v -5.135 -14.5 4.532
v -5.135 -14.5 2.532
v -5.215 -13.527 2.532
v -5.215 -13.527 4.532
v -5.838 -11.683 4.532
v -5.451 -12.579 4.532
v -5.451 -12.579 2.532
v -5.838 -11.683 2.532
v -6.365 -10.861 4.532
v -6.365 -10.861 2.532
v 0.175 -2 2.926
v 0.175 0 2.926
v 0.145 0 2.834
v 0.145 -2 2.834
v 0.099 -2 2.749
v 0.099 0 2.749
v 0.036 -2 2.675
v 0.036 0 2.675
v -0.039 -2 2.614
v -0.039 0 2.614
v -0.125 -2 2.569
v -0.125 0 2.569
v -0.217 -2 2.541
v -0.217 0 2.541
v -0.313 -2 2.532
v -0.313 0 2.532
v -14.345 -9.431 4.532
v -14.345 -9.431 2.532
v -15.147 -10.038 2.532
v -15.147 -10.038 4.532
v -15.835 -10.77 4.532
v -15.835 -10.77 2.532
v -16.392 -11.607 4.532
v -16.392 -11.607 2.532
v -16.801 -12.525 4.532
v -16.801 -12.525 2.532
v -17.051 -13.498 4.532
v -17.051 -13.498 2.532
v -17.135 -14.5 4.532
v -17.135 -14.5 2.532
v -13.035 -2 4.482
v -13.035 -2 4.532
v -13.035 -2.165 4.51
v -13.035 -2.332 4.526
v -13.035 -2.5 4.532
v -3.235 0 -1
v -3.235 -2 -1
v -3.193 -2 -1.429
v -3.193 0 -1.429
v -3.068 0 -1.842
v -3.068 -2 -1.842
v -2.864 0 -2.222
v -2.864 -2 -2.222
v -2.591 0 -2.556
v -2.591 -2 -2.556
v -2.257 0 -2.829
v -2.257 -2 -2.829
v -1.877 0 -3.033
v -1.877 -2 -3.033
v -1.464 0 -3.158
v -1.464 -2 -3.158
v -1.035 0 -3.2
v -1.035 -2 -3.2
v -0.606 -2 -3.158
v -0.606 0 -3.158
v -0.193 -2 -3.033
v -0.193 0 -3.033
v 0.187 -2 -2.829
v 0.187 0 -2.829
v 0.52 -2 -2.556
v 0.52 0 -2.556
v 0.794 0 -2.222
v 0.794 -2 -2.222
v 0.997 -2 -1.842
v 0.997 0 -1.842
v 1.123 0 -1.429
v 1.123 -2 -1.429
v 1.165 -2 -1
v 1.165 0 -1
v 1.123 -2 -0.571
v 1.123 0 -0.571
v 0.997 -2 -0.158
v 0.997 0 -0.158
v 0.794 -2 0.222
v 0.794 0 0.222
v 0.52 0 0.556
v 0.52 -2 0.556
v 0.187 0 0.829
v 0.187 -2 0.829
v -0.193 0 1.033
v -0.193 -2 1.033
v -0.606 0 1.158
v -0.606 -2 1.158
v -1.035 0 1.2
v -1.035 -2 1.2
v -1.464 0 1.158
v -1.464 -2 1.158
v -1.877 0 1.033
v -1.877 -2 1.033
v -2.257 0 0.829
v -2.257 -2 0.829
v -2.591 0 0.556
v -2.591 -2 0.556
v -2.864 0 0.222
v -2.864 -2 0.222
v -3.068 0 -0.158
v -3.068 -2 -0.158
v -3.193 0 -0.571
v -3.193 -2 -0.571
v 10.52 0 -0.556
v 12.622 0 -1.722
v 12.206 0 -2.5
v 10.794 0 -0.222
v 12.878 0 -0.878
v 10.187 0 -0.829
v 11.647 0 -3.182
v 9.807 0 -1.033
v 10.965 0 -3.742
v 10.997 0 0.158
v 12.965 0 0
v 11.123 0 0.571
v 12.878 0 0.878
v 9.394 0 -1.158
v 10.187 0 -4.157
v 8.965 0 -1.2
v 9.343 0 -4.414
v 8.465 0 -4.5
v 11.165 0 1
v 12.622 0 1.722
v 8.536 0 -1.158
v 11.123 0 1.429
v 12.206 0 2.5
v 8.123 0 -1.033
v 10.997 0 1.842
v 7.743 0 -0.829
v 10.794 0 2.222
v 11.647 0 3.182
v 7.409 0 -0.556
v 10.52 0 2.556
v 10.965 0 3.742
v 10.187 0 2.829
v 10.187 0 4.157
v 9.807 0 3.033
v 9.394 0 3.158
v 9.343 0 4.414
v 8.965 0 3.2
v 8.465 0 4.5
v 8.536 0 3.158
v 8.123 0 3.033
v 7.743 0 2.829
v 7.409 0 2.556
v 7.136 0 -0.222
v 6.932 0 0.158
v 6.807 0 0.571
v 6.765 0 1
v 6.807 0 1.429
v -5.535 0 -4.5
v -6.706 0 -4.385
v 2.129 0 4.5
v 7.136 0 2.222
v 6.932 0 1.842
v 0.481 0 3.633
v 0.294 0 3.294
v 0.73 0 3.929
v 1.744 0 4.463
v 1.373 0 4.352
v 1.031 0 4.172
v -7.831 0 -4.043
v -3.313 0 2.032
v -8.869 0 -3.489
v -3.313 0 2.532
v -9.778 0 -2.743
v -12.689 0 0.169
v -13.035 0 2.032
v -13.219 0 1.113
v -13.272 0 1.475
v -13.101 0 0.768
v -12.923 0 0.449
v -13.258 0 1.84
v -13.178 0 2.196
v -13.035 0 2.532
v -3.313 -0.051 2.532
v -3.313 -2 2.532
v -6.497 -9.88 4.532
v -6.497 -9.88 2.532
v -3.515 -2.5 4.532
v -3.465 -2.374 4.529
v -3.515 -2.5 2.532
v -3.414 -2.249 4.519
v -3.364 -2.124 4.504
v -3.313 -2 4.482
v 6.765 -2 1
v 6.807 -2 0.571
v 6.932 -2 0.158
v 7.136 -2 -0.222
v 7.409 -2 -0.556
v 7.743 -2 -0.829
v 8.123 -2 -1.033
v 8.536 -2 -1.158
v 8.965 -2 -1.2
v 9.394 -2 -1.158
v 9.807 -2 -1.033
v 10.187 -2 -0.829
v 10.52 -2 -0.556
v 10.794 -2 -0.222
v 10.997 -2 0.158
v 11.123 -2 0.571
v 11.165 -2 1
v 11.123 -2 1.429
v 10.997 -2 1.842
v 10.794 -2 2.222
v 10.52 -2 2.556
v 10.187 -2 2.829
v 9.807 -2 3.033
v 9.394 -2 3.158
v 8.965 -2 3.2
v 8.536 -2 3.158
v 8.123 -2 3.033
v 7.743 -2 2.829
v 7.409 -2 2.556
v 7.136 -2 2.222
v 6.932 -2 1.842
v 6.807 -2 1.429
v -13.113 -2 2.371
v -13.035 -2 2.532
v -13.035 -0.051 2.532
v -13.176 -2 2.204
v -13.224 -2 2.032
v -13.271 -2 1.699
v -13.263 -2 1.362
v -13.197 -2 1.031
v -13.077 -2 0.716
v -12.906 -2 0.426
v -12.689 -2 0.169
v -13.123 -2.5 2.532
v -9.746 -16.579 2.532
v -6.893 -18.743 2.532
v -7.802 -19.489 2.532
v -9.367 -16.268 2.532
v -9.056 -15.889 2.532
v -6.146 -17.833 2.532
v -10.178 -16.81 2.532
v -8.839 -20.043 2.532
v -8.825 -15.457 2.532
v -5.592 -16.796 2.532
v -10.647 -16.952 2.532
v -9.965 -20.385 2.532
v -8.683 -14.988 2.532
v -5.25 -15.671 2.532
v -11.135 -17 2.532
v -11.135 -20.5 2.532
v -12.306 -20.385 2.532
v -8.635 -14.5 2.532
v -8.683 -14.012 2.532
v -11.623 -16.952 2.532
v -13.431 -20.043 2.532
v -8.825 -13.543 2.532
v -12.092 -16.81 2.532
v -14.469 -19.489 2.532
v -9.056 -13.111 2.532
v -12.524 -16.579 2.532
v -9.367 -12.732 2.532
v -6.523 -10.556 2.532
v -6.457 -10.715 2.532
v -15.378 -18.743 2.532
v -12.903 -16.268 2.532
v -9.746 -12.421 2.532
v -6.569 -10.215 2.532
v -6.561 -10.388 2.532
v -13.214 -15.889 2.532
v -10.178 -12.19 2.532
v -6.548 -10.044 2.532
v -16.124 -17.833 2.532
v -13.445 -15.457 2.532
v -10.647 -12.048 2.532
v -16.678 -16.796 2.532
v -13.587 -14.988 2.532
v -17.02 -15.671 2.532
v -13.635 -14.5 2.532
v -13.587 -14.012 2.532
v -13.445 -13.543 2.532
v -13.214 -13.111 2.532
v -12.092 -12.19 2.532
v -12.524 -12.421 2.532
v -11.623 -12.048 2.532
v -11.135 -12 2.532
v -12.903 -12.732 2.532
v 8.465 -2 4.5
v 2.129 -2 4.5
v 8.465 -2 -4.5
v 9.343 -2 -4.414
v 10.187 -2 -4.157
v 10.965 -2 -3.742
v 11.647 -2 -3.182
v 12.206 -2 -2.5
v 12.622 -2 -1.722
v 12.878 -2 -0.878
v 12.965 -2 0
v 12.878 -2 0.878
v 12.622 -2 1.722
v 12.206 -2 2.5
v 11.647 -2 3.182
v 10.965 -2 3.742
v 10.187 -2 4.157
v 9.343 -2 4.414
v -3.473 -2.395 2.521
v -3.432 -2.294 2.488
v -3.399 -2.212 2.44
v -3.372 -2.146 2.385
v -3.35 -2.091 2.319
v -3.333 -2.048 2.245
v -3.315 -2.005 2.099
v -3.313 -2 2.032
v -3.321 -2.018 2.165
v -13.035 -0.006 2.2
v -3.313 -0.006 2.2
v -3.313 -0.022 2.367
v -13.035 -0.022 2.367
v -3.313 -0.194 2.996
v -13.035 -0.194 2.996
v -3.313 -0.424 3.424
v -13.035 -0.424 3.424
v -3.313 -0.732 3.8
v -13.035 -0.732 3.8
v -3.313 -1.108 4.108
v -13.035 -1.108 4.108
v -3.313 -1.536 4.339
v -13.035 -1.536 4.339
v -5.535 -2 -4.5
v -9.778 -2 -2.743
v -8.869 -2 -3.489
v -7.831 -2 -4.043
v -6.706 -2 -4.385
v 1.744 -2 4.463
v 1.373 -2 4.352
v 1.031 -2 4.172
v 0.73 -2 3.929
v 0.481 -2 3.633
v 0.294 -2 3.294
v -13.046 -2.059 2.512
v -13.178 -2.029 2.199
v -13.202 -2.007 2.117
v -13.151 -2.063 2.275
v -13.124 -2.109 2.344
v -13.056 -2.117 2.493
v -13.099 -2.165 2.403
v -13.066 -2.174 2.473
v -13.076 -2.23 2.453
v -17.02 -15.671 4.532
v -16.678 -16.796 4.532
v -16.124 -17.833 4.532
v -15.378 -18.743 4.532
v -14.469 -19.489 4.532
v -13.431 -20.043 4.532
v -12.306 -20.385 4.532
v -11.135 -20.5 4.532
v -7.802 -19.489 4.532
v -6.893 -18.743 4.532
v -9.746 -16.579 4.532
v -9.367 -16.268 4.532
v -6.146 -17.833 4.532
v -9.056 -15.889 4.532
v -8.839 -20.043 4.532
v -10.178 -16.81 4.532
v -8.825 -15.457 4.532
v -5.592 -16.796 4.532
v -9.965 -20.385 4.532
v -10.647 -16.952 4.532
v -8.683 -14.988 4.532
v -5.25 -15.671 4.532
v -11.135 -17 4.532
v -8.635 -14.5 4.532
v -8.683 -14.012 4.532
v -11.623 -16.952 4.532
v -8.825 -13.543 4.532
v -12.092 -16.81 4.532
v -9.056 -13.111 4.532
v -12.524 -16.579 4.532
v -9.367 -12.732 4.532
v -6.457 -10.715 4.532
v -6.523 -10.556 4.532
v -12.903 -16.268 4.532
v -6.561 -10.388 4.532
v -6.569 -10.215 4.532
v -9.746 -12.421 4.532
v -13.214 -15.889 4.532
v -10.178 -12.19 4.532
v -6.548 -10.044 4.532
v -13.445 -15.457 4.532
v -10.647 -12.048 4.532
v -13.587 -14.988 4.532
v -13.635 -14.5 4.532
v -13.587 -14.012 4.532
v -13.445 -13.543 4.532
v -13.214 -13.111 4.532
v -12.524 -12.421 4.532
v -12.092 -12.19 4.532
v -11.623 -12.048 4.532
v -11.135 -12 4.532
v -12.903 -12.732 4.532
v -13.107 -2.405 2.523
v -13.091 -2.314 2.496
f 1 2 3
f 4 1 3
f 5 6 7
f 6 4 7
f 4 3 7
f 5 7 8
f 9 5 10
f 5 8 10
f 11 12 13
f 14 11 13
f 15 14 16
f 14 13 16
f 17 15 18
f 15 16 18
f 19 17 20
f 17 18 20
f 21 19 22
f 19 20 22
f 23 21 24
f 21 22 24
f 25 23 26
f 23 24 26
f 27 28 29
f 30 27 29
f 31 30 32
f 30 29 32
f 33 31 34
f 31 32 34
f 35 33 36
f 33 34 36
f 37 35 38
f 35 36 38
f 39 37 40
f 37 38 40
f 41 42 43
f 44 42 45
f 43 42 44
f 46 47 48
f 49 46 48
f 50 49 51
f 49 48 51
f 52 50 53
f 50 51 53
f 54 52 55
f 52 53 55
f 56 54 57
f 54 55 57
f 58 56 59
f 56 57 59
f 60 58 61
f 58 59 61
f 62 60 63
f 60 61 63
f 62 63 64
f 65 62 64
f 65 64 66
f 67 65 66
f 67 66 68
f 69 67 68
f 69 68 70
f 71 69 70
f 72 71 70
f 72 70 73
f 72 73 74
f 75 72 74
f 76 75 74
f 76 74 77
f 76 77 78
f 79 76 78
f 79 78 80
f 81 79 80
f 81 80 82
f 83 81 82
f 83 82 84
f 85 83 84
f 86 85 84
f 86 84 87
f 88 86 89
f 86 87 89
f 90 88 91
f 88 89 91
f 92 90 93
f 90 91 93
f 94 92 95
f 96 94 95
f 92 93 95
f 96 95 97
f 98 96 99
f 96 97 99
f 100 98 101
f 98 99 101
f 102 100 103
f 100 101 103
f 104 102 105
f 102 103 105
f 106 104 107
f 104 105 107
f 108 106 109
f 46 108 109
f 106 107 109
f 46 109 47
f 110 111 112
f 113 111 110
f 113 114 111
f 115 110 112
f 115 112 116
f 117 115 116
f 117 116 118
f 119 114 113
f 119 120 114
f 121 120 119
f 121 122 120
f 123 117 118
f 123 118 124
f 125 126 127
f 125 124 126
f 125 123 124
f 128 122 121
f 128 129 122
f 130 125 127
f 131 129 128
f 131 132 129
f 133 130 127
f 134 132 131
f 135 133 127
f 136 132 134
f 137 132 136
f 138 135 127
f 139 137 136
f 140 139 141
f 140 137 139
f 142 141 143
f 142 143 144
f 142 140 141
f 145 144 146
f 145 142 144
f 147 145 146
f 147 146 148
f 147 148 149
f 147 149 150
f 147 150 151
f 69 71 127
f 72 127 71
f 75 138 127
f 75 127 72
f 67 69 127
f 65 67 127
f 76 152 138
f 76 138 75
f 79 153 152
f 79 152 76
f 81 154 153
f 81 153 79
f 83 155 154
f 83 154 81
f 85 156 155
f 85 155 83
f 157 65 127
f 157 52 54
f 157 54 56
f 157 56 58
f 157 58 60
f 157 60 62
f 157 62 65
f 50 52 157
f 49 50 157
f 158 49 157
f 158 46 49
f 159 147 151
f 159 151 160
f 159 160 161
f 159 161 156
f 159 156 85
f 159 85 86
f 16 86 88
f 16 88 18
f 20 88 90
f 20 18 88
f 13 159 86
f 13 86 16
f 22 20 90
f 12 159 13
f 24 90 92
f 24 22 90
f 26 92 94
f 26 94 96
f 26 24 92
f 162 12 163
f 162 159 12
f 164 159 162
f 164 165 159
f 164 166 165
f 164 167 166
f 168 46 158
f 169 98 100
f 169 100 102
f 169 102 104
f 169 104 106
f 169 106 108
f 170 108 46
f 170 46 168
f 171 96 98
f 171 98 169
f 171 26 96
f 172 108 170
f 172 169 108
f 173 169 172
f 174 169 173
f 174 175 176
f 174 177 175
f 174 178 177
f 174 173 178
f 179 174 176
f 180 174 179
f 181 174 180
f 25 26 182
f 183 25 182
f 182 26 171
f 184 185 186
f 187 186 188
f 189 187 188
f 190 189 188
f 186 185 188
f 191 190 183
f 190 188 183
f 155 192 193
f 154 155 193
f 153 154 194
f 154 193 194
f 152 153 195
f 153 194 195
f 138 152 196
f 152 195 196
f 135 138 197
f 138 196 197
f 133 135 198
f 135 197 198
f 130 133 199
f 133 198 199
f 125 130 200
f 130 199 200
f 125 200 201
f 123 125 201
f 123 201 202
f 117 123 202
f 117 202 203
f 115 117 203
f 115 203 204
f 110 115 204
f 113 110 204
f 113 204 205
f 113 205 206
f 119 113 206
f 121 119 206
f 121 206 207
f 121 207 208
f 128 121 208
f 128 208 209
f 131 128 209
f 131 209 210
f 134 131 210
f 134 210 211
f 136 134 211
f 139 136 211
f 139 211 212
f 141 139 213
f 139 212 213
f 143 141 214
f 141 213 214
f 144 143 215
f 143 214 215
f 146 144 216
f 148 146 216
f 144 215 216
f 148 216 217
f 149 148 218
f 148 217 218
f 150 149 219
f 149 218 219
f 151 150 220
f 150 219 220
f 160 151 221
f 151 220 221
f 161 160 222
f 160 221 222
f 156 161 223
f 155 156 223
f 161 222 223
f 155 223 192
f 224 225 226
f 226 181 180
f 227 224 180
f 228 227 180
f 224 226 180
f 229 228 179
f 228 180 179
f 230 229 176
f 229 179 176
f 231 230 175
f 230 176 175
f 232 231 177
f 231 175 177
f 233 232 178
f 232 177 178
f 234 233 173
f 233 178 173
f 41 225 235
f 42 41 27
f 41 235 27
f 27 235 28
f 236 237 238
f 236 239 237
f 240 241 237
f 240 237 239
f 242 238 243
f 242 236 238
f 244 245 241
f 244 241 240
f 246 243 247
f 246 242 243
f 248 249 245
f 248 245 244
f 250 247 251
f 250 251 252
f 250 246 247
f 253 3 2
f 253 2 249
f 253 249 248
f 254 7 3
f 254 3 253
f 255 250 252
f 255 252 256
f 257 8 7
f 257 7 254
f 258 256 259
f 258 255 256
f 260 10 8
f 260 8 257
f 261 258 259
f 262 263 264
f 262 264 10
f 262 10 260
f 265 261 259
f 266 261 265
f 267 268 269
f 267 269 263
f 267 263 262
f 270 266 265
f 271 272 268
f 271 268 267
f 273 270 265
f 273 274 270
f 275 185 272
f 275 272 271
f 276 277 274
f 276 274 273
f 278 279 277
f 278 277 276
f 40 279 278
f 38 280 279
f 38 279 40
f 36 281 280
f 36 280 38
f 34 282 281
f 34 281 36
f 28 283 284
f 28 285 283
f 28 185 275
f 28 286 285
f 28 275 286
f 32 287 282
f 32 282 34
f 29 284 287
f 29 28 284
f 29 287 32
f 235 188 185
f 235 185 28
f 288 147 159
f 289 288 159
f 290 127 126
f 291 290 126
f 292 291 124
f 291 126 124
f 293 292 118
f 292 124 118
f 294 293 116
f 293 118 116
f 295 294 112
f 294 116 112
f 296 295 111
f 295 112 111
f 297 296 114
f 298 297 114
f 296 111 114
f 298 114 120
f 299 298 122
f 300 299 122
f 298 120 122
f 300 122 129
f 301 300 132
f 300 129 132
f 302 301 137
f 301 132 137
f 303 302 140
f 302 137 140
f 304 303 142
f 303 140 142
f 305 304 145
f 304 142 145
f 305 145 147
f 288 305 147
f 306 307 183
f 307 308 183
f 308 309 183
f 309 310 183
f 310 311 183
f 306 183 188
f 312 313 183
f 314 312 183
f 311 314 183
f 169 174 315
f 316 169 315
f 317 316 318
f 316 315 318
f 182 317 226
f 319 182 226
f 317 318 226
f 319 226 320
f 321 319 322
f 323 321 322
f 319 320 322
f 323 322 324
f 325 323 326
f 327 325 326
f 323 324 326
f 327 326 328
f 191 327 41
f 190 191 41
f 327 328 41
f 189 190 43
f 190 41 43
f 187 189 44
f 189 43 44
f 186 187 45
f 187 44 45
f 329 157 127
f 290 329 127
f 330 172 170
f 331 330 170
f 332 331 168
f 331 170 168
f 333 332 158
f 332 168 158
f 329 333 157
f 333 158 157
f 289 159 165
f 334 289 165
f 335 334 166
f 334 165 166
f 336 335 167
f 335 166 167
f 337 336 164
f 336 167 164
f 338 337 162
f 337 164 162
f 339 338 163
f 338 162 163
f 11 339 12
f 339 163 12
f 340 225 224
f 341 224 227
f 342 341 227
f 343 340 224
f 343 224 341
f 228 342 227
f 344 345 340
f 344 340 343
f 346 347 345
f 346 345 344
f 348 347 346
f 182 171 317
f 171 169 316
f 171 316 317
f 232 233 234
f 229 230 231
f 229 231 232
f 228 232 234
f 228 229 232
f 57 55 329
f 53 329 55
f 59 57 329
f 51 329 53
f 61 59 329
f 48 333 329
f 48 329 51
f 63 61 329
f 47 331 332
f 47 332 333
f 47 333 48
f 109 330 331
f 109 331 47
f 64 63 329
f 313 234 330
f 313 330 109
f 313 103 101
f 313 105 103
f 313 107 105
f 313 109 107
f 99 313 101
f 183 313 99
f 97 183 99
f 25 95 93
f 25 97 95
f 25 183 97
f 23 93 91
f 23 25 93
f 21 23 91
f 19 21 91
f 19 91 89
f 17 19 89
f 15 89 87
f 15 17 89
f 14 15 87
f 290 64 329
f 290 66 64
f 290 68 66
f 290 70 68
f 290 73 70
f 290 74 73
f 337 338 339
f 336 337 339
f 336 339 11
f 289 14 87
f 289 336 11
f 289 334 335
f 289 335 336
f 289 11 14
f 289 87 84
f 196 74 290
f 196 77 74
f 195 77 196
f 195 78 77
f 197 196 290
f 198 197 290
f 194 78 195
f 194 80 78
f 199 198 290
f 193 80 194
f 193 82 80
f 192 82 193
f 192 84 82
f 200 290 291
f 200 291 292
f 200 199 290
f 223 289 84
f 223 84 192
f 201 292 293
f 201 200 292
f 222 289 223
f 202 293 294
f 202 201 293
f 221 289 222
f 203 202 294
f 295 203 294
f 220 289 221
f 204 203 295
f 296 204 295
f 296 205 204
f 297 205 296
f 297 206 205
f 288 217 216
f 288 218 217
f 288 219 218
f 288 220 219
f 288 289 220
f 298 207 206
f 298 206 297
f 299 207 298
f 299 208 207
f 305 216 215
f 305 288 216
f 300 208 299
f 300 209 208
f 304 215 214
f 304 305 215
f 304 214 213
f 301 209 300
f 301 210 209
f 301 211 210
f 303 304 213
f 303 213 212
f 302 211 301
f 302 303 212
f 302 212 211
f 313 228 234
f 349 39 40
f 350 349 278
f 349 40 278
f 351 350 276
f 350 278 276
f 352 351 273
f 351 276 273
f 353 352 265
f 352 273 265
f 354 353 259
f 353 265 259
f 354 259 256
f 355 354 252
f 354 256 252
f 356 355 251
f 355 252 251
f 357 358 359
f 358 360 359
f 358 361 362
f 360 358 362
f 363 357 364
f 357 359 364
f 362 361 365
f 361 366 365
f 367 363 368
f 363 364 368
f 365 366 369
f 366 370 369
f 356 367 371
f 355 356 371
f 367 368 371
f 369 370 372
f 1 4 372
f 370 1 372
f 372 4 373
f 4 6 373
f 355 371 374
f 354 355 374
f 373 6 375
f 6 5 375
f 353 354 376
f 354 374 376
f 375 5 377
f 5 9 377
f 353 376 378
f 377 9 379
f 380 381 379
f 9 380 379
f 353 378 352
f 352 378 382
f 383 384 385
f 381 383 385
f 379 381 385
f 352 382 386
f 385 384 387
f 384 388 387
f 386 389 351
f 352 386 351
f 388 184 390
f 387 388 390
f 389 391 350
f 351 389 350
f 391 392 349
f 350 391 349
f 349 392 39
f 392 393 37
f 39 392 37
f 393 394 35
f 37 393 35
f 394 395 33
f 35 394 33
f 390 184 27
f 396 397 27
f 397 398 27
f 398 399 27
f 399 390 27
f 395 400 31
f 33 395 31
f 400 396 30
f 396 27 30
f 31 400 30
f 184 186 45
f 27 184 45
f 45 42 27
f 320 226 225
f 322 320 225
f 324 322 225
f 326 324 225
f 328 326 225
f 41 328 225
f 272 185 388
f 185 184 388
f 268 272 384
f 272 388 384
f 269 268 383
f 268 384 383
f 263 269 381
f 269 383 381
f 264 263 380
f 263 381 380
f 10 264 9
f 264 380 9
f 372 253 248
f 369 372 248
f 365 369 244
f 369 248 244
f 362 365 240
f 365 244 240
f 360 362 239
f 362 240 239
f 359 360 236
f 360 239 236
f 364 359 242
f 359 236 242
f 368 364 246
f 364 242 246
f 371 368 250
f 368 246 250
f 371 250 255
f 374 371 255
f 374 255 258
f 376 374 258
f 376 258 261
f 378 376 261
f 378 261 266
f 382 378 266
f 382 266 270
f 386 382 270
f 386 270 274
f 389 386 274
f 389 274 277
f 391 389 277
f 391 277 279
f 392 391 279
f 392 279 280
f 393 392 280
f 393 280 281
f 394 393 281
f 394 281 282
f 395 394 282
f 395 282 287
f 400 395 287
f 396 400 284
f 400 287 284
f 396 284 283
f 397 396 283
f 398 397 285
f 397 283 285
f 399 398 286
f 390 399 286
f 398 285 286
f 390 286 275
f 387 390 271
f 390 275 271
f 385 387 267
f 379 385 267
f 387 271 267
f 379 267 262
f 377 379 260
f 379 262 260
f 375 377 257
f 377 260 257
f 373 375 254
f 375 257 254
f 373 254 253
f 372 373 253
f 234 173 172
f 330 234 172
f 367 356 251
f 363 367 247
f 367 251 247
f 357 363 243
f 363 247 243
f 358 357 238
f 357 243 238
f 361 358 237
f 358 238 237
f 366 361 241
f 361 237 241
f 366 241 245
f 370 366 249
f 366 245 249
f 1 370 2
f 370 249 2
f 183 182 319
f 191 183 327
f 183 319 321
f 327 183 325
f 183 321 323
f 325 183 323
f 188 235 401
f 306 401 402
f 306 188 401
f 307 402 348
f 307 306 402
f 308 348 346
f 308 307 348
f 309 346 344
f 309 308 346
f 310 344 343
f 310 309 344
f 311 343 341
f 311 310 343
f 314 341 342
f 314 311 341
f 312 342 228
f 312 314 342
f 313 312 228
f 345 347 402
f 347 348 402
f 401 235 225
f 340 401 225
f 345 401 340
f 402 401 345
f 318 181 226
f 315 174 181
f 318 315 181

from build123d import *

# Parameters (mm, degrees)
F1_DEPTH     = 2
F2_D         = 4.4
F3_W         = 13.8216872486
F3_H         = 2
F4_DEPTH     = 20.5
F5_R         = 2.5
F6_DEPTH     = 25
F7_R         = 1
F8_T4_DEPTH  = 12.2216872486
F8_T10_DEPTH = 12.2216872486
F8_S11_R     = 2
F8_T12_DEPTH = 8
F10_DEPTH    = 9.7216872486


# Not quite as in the source:
# - a fillet or chamfer that OpenCascade refuses, or shapes differently, is made with other operations: its cross-section is extruded or revolved along the edge and cut away or added


with BuildPart() as f1:
    # F0 (on Front) → F1 (new body)
    with BuildSketch(Plane.XZ):
        with BuildLine():
            Line((-5.5351668461, -4.5), (8.4648331539, -4.5))
            ThreePointArc((8.4648331539, -4.5), (12.9648331539, 0), (8.4648331539, 4.5))
            Line((8.4648331539, 4.5), (2.1292536968, 4.5))
            ThreePointArc((2.1292536968, 4.5), (0.8745117295, 4.0574410408), (0.1750670613, 2.9256225954))
            ThreePointArc((0.1750670613, 2.9256225954), (0.0002058943, 2.6426679841), (-0.3134795975, 2.5320282443))
            Line((-0.3134795975, 2.5320282443), (-13.0351668461, 2.5320282443))
            ThreePointArc((-13.0351668461, 2.5320282443), (-13.2536814771, 1.2929397336), (-12.6890072408, 0.1685590205))
            Line((-12.6890072408, 0.1685590205), (-9.7778075332, -2.7426406871))
            ThreePointArc((-9.7778075332, -2.7426406871), (-7.8312674403, -4.0432771951), (-5.5351668461, -4.5))
        make_face()
    extrude(amount=F1_DEPTH)

    # F2 (through all)
    with Locations(Plane(origin=(0, 0, 0), x_dir=(1, 0, 0), z_dir=(0, 1, 0))):
        with Locations((-1.0351668461, 1), (8.9648331539, -1)):
            Hole(F2_D / 2)

    # F3 (on face) → F4 (join)
    with BuildSketch(Plane(origin=(0, 0, 0), x_dir=(-1, 0, 0), z_dir=(0, 1, 0))):
        with Locations((10.2243232218, 3.5320282443)):
            Rectangle(F3_W, F3_H)
    extrude(amount=-F4_DEPTH)

    # F5 (on face) → F6 (cut)
    with BuildSketch(Plane(origin=(0, 0, 2.5320282443), x_dir=(1, 0, 0), z_dir=(0, 0, -1))):
        with BuildLine():
            Line((-6.7216205274, 10.43544481), (-3.3134795975, 2))
            Line((-3.3134795975, 2), (-3.3134795975, 20.5))
            Line((-3.3134795975, 20.5), (-11.1351668461, 20.5))
            ThreePointArc((-11.1351668461, 20.5), (-6.892526159, 18.7426406871), (-5.1351668461, 14.5))
            ThreePointArc((-5.1351668461, 14.5), (-5.5458342423, 12.3184040145), (-6.7216205274, 10.43544481))
        make_face()
        with BuildLine():
            Line((-17.1351668461, 20.5), (-17.1351668461, 14.5))
            ThreePointArc((-17.1351668461, 14.5), (-15.3778075332, 18.7426406871), (-11.1351668461, 20.5))
            Line((-11.1351668461, 20.5), (-17.1351668461, 20.5))
        make_face()
        with BuildLine():
            Line((-17.1351668461, 0), (-13.0351668461, 0))
            Line((-13.0351668461, 0), (-13.0351668461, 2))
            Line((-13.0351668461, 2), (-14.3454662645, 9.4310772699))
            ThreePointArc((-14.3454662645, 9.4310772699), (-16.3916769293, 11.6070600171), (-17.1351668461, 14.5))
            Line((-17.1351668461, 14.5), (-17.1351668461, 0))
        make_face()
        with Locations((-11.1351668461, 14.5)):
            Circle(F5_R)
    extrude(amount=-F6_DEPTH, mode=Mode.SUBTRACT)

    # F7
    f7_edges = [f1.edges().sort_by_distance(p)[0] for p in [
        (-6.721621, -10.435445, 3.532028),
    ]]
    fillet(f7_edges, radius=F7_R)

    # F8: fillet of radius 0.5 on 1 edges, made by hand


with BuildPart() as f8_tool2:
    # F8_s3 → F8_t4 (new body)
    with BuildSketch(Plane.YZ.offset(-2.0634795975)):
        with BuildLine():
            ThreePointArc((-2.5, 2.5320282443), (-2.1464466094, 2.3855816349), (-2, 2.0320282443))
            Line((-2, 2.0320282443), (-2, 2.5320282443))
            Line((-2, 2.5320282443), (-2.5, 2.5320282443))
        make_face()
    extrude(amount=-F8_T4_DEPTH)

    split(bisect_by=Plane(origin=(-2.1538403044, 0.8702079692, 0), x_dir=(0, 0, 1), z_dir=(-0.9271838546, 0.3746065934, 0)), keep=Keep.TOP)

    split(bisect_by=Plane(origin=(-12.3000883277, 2.1688374373, 0), x_dir=(0, 0, 1), z_dir=(0.984807753, -0.1736481777, 0)), keep=Keep.TOP)


with BuildPart() as f1_1:
    add(f1.part)

    # F8_t1: union F8_tool2
    add(f8_tool2.part)


with BuildPart() as f8_tool8:
    # F8_s9 → F8_t10 (new body)
    with BuildSketch(Plane.YZ.offset(-2.0634795975)):
        with BuildLine():
            ThreePointArc((-2.5, 2.5320282443), (-2.1464466094, 2.3855816349), (-2, 2.0320282443))
            Line((-2, 2.0320282443), (-2, 2.5320282443))
            Line((-2, 2.5320282443), (-2.5, 2.5320282443))
        make_face()
    extrude(amount=-F8_T10_DEPTH)

    # F8_s11 → F8_t12 (intersect, symmetric)
    with BuildSketch(Plane.XZ.offset(2.2)):
        with Locations((-11.2747936785, 1.5827725829)):
            Circle(F8_S11_R)
    extrude(amount=F8_T12_DEPTH, both=True, mode=Mode.INTERSECT)


with BuildPart() as f1_2:
    add(f1_1.part)

    # F8_t7: union F8_tool8
    add(f8_tool8.part)

    # F9 (on face) → F10 (cut, through all)
    with BuildSketch(Plane(origin=(-13.0351668461, 0, 0), x_dir=(0, -1, 0), z_dir=(-1, 0, 0))):
        with BuildLine():
            Line((2.5, 4.5320282443), (2, 4.5320282443))
            Line((2, 4.5320282443), (0, 4.5320282443))
            Line((0, 4.5320282443), (0, 2.5320282443))
            Line((0, 2.5320282443), (0, 2.0320282443))
            ThreePointArc((0, 2.0320282443), (0.732233047, 3.7997951973), (2.5, 4.5320282443))
        make_face()
    extrude(amount=-F10_DEPTH, mode=Mode.SUBTRACT)


solid = f1_2.part
